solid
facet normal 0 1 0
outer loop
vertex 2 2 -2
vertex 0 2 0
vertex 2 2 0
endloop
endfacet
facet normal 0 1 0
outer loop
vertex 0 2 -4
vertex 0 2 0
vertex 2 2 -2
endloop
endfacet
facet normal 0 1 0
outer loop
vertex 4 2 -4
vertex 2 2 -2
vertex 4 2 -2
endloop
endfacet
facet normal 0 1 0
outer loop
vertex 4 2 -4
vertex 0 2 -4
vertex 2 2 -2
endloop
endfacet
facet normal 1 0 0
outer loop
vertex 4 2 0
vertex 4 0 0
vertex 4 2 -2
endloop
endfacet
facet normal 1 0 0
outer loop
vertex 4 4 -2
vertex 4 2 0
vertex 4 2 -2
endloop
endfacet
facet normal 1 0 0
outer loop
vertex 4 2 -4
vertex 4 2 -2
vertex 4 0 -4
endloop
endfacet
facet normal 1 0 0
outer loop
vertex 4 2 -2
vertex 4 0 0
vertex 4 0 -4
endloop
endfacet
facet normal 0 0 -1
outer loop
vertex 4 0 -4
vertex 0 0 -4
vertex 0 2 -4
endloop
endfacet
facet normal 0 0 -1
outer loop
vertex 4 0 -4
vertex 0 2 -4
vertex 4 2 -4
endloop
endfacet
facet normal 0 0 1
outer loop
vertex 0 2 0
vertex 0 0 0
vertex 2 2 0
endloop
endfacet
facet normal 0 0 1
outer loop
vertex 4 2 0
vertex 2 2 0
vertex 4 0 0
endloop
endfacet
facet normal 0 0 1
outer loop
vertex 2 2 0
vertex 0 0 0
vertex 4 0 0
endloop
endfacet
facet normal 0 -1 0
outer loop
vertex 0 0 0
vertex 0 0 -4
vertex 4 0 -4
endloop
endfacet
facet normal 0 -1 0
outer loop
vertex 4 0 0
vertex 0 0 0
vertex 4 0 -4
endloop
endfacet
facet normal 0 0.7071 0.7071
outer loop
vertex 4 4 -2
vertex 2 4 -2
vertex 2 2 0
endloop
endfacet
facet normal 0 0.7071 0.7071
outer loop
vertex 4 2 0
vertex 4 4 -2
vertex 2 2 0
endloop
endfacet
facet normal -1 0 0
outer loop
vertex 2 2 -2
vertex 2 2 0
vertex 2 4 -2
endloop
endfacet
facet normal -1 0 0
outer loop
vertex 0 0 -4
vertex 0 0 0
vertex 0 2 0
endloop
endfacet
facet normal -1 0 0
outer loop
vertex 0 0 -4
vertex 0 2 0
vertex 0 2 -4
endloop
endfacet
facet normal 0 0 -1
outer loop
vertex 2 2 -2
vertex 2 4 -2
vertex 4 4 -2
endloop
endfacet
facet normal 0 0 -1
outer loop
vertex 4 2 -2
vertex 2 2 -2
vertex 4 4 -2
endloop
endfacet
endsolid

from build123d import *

# Parameters (mm, degrees)
SKETCH1_W           = 4
SKETCH1_H           = 4
BOSS_EXTRUDE1_DEPTH = 4
CUT_EXTRUDE1_DEPTH  = 2
CUT_EXTRUDE2_DEPTH  = 10


with BuildPart() as part:
    # Sketch1 → Boss-Extrude1 (new body)
    with BuildSketch(Plane(origin=(0, 0, 0), x_dir=(1, 0, 0), z_dir=(0, 1, 0))):
        with Locations((2, 2)):
            Rectangle(SKETCH1_W, SKETCH1_H)
    extrude(amount=BOSS_EXTRUDE1_DEPTH)

    # Sketch2 → Cut-Extrude1 (cut)
    with BuildSketch(Plane(origin=(0, 4, 0), x_dir=(1, 0, 0), z_dir=(0, 1, 0))):
        Polygon((2, 0), (2, 2), (4, 2), (4, 4), (0, 4), (0, 0), align=None)
    extrude(amount=-CUT_EXTRUDE1_DEPTH, mode=Mode.SUBTRACT)

    # Sketch3 → Cut-Extrude2 (cut)
    with BuildSketch(Plane.ZY):
        Polygon((0, 2), (0, 4), (-2, 4), align=None)
    extrude(amount=-CUT_EXTRUDE2_DEPTH, mode=Mode.SUBTRACT)


solid = part.part
